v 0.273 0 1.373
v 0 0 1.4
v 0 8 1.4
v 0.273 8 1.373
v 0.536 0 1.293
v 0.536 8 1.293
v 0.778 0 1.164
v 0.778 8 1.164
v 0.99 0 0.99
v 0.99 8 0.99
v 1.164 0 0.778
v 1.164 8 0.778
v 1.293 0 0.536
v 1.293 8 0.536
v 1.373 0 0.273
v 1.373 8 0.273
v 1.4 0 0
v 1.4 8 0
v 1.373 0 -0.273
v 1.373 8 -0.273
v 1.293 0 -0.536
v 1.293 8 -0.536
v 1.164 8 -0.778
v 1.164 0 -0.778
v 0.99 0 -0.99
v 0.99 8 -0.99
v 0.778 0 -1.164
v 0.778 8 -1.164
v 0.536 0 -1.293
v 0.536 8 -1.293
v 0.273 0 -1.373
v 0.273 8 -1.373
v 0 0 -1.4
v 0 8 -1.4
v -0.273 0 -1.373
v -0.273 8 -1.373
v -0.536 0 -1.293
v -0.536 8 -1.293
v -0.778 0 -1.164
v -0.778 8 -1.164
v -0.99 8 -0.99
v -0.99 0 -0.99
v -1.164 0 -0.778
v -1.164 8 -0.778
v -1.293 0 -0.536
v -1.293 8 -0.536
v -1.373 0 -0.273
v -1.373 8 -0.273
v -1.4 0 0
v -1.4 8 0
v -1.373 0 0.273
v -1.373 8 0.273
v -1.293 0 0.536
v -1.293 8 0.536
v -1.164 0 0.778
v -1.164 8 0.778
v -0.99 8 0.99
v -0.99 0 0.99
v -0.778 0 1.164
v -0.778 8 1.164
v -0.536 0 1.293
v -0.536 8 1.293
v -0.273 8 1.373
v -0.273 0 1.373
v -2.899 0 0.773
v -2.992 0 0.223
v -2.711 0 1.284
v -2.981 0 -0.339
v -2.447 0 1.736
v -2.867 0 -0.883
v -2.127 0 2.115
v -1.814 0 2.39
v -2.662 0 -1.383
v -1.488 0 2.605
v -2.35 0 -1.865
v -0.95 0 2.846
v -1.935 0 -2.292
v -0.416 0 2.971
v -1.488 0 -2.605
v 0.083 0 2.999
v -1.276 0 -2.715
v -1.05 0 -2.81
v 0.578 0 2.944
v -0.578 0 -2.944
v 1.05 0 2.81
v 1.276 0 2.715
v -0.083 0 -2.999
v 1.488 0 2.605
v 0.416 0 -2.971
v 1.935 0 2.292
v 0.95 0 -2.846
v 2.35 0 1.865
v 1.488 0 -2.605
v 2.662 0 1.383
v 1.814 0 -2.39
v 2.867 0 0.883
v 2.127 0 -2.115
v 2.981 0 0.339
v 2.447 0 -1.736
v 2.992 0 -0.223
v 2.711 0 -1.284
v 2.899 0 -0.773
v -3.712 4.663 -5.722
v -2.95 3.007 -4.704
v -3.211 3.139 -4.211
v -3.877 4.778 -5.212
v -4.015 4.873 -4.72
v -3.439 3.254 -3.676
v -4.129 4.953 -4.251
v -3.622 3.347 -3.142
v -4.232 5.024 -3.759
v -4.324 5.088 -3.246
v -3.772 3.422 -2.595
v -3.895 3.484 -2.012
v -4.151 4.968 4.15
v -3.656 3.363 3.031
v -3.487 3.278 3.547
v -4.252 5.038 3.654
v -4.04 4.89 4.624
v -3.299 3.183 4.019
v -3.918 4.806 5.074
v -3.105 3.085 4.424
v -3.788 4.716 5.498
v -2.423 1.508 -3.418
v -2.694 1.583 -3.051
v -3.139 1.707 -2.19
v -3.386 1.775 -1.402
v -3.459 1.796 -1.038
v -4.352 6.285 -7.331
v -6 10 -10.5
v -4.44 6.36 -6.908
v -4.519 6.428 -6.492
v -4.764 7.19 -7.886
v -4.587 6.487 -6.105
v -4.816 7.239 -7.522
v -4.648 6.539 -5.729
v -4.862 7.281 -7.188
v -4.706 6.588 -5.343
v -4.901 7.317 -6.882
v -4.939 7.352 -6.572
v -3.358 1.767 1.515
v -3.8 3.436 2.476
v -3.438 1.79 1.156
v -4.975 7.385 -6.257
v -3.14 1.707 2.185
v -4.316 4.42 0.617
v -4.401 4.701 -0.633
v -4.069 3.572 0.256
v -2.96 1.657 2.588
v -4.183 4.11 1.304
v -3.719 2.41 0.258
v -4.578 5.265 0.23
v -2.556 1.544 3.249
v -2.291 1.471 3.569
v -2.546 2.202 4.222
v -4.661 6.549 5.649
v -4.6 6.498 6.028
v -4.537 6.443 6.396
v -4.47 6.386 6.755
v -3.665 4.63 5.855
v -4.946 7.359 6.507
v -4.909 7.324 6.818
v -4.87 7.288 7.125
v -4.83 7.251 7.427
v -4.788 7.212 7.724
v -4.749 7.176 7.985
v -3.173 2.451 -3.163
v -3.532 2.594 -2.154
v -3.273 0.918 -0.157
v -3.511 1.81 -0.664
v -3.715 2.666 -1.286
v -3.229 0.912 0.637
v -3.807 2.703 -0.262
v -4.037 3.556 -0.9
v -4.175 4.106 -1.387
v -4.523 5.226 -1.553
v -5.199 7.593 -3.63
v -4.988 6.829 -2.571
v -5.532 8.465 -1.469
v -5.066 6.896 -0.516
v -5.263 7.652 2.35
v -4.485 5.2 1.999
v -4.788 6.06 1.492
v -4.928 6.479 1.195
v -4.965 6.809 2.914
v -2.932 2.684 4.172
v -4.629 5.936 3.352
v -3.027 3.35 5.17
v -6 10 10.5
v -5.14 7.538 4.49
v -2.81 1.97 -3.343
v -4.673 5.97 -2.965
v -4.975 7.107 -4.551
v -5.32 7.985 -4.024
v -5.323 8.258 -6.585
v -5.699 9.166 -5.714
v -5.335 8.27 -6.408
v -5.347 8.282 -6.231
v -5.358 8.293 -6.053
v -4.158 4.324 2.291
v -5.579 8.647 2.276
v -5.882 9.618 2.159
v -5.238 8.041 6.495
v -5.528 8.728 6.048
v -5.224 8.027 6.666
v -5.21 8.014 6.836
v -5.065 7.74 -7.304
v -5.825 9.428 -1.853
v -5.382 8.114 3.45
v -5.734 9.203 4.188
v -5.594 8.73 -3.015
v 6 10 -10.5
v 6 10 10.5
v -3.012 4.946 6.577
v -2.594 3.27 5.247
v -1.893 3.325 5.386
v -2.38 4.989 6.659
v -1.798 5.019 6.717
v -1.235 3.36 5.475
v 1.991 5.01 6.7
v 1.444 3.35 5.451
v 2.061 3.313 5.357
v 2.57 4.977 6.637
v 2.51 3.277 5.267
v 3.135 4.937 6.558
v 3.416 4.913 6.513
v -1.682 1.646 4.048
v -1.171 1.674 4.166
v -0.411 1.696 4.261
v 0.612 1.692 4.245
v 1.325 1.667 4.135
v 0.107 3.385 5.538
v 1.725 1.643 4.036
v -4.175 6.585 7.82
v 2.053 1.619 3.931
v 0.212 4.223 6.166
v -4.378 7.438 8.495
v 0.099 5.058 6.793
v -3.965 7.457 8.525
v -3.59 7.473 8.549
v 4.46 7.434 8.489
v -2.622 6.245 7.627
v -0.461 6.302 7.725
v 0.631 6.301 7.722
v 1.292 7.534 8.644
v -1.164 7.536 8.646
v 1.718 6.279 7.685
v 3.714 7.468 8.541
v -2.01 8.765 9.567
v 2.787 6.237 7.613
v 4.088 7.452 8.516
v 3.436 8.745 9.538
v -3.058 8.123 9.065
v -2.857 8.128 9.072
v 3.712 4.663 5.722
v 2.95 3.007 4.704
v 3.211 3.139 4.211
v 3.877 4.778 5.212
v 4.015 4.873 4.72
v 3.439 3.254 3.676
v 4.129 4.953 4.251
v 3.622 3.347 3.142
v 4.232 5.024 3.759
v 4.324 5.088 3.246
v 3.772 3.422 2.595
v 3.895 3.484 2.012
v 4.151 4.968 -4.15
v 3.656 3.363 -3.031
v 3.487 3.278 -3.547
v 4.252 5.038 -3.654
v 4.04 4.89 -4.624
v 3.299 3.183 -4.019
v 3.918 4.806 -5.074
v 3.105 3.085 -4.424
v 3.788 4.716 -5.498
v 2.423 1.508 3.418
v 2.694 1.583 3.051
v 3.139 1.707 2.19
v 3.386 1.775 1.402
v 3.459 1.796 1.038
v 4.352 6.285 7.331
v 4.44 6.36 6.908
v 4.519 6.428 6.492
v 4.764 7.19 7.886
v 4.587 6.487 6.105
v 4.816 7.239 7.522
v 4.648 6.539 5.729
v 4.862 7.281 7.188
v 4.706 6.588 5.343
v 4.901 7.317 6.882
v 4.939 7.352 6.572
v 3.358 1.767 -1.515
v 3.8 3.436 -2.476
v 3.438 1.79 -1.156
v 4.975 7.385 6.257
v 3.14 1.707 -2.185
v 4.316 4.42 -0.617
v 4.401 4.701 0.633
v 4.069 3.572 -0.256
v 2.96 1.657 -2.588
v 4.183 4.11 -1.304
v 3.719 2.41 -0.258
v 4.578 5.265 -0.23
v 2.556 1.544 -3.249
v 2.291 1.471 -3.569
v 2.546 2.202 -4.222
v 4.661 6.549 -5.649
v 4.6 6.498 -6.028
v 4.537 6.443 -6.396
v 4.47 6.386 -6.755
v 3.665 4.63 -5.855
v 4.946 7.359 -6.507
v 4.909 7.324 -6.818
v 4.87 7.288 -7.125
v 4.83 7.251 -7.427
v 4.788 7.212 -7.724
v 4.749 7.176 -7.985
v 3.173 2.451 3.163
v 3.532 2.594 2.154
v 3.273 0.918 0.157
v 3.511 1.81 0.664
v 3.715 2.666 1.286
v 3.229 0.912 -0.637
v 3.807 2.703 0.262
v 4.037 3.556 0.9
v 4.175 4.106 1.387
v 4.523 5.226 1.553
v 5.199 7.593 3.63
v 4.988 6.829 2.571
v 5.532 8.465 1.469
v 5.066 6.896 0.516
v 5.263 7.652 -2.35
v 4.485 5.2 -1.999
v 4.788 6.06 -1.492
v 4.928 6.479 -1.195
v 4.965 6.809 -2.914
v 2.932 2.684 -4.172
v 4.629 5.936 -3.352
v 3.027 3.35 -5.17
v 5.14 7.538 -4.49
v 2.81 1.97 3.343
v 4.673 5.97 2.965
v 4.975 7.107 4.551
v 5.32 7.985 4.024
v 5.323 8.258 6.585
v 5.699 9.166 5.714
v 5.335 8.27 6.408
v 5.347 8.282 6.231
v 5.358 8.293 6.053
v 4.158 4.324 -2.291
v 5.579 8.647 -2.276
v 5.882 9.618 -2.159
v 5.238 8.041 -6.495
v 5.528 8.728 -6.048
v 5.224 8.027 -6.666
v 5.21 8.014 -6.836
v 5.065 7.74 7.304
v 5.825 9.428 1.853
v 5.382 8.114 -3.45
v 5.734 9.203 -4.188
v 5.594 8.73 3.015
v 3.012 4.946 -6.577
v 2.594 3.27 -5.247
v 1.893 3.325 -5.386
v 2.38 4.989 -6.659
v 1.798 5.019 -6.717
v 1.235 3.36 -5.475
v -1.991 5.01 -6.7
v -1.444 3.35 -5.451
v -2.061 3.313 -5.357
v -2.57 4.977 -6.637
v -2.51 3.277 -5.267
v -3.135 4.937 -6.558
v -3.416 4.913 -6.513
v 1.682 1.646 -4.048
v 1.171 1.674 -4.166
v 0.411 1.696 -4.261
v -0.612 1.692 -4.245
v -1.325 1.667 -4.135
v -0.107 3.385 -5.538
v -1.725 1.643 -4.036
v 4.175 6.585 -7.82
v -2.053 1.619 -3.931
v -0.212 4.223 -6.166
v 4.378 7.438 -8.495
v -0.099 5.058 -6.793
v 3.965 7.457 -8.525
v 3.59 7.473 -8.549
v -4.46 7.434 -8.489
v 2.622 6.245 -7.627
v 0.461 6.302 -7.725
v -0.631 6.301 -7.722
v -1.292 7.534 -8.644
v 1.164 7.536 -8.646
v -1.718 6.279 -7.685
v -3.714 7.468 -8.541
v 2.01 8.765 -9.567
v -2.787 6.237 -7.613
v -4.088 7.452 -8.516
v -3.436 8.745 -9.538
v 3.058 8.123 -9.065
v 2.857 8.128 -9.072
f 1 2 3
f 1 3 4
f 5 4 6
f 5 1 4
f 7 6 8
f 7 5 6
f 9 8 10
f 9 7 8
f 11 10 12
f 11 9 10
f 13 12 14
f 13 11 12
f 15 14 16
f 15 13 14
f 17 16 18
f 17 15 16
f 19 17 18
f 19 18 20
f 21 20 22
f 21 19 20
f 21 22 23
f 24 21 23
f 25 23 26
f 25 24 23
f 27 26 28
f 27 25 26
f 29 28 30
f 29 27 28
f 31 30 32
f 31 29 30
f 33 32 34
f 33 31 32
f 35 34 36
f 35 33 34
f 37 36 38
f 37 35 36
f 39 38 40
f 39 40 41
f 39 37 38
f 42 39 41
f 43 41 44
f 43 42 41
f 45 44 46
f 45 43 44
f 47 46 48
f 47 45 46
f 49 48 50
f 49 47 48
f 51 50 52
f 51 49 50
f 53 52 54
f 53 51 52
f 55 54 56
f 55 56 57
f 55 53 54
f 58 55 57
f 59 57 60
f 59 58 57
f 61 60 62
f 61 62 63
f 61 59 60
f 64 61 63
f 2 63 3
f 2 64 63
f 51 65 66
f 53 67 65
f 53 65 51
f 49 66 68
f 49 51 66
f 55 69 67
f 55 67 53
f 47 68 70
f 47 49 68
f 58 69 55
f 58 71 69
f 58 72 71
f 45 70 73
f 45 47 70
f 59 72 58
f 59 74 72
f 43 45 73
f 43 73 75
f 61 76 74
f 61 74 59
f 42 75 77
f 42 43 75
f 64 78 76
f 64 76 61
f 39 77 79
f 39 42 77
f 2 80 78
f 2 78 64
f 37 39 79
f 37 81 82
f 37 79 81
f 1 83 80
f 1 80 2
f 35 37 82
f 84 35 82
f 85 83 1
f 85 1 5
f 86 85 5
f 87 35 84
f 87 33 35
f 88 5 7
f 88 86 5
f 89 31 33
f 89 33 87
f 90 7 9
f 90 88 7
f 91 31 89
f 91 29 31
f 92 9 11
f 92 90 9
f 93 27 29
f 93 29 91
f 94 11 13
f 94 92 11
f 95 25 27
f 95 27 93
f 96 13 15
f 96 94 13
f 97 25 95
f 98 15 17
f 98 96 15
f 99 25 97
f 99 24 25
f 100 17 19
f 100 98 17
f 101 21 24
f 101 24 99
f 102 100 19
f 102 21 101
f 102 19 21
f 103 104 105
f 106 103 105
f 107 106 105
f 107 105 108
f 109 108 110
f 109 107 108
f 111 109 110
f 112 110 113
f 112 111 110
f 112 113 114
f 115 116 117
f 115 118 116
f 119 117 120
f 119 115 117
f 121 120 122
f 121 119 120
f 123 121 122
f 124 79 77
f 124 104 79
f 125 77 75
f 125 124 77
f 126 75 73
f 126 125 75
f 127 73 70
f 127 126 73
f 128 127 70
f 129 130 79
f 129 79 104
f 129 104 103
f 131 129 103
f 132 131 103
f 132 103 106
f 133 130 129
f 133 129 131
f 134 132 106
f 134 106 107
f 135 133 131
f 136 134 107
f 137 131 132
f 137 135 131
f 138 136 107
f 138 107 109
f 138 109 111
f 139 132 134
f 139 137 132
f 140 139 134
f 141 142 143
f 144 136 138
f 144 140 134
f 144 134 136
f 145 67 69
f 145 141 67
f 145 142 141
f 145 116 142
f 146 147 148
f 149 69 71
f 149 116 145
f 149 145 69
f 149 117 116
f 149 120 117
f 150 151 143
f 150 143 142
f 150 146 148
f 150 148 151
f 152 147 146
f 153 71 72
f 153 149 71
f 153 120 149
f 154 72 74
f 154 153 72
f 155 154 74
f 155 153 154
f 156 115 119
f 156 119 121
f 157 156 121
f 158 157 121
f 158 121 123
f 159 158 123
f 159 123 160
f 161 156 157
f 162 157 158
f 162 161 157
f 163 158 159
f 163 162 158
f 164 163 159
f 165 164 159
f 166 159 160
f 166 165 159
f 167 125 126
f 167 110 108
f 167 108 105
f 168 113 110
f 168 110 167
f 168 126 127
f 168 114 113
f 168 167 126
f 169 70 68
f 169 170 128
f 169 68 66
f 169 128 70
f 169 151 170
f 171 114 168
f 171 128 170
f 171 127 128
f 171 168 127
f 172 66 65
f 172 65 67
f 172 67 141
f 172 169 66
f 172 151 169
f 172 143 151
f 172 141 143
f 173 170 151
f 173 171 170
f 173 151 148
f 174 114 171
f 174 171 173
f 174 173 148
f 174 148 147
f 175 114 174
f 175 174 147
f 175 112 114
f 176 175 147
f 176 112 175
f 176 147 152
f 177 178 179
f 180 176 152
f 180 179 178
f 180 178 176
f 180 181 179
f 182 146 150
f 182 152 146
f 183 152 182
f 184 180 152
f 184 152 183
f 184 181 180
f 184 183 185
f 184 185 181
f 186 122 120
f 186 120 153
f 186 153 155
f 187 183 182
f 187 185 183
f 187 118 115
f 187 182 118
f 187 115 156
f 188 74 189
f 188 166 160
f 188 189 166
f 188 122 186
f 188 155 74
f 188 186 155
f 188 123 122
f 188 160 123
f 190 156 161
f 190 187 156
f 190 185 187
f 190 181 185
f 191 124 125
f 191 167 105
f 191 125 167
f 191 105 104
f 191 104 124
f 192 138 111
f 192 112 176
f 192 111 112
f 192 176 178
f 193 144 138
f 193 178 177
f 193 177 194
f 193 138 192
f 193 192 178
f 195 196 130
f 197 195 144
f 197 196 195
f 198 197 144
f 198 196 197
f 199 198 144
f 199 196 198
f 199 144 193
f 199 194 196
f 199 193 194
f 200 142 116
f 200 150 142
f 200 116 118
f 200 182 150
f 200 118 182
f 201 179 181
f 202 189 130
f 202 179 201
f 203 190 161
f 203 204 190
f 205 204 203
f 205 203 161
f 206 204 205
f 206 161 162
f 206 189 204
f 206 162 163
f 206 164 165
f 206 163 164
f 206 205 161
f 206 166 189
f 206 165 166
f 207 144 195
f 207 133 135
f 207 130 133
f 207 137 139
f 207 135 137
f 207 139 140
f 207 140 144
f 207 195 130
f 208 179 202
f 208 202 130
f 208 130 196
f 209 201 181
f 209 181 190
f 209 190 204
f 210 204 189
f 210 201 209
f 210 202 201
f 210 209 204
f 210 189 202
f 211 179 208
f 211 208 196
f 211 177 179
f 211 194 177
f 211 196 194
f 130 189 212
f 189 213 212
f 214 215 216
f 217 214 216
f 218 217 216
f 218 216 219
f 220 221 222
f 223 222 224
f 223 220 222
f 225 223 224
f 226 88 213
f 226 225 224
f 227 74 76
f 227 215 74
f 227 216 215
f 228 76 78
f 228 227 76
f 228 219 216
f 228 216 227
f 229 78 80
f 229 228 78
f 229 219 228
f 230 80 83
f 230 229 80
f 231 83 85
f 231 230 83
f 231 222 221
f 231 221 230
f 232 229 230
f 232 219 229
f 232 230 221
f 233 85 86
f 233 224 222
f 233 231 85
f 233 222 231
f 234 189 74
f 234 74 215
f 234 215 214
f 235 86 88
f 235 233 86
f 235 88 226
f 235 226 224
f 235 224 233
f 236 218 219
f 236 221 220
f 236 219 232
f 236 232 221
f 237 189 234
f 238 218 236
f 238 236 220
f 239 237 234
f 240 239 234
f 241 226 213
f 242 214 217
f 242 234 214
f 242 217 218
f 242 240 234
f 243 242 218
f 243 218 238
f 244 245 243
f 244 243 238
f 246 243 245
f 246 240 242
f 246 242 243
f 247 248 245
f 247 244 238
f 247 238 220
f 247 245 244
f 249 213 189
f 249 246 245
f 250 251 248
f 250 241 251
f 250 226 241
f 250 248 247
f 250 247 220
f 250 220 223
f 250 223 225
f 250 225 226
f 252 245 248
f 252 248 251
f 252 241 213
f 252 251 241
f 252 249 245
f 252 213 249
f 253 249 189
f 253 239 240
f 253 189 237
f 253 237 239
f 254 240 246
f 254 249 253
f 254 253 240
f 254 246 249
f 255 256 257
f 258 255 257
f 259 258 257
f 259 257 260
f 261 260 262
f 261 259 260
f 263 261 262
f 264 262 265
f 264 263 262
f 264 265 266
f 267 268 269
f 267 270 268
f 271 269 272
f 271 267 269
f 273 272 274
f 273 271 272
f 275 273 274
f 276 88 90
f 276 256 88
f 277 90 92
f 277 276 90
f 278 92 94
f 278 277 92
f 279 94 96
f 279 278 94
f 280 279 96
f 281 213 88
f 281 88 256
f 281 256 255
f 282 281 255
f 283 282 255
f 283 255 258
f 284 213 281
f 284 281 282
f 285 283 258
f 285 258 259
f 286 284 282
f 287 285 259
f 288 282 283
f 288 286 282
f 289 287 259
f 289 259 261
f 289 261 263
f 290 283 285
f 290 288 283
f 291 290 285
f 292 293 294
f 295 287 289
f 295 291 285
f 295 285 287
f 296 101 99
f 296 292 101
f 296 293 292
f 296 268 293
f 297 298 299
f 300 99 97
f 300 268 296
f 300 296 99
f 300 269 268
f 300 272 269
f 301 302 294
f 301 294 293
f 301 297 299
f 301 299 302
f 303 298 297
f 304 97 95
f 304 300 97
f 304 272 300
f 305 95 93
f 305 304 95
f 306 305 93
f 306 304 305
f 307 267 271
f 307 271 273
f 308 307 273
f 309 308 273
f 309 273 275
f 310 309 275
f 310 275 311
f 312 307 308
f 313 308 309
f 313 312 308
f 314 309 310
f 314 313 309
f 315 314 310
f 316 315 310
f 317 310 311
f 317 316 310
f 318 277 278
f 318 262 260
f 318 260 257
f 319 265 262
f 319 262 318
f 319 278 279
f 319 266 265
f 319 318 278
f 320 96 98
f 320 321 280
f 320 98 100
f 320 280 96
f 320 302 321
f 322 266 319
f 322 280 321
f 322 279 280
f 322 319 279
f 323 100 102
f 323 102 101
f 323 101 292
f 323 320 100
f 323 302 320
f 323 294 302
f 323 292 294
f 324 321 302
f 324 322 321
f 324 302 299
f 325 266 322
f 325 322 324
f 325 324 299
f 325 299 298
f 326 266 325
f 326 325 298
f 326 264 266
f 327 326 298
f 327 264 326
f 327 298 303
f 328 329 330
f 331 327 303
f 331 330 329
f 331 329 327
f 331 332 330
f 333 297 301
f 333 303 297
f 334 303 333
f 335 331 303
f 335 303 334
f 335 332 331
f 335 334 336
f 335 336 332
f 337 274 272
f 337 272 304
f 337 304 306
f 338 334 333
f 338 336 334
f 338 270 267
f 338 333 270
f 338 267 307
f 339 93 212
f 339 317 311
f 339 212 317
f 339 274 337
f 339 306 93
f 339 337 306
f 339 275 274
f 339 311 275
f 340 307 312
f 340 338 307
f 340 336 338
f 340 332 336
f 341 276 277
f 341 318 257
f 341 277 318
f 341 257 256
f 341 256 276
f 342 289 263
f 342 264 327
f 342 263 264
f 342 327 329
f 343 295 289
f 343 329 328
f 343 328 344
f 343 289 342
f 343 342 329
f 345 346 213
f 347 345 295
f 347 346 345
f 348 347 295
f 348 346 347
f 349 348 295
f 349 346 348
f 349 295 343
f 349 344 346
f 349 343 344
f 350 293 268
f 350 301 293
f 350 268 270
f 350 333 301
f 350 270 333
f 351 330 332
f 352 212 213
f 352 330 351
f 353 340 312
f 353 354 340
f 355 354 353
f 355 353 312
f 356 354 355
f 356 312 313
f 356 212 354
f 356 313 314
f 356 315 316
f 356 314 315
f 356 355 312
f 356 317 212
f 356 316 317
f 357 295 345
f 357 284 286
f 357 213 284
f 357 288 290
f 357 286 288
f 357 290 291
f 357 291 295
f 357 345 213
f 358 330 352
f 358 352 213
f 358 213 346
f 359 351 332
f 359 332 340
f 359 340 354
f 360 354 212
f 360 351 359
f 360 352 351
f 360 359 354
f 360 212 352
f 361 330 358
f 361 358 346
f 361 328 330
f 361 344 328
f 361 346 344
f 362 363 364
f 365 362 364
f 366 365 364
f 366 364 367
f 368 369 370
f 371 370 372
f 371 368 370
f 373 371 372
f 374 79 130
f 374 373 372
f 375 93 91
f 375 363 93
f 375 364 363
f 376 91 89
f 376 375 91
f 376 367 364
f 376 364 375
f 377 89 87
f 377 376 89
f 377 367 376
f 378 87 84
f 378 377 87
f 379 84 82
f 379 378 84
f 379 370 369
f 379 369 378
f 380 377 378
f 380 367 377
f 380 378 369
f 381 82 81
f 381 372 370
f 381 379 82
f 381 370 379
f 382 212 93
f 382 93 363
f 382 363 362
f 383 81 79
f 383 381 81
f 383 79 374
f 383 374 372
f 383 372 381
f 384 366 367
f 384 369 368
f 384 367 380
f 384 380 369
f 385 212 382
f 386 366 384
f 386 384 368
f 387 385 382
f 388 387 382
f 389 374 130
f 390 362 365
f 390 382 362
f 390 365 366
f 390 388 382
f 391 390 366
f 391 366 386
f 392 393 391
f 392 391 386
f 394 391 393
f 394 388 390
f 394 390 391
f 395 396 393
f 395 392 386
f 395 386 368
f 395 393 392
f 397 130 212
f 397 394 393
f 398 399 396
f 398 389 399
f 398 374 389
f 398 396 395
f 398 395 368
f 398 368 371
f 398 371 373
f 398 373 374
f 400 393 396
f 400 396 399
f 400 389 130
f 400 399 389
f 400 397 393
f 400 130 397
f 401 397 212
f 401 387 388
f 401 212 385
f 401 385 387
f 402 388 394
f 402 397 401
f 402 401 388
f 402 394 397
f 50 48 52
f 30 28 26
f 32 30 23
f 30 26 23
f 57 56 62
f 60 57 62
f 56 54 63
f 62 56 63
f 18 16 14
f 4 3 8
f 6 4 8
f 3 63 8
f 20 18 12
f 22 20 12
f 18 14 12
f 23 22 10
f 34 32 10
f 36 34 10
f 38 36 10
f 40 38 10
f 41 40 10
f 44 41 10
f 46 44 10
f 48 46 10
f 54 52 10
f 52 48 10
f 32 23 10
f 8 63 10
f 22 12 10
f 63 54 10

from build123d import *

# Parameters (mm, degrees)
SKETCH3_R          = 1.4
CUT_EXTRUDE1_DEPTH = 8


with BuildPart() as part:
    # Sketch1 for Loft2 → Loft2 section 0
    with BuildSketch(Plane(origin=(0, 0, 0), x_dir=(1, 0, 0), z_dir=(0, 1, 0))):
        with BuildLine():
            # circular arc as an exact rational Bezier (weights 1, cos(half-angle), 1)
            Bezier((-1.488416815, -2.604729426), (0, -3.455253321), (1.488416815, -2.604729426), weights=[1, 0.868243142, 1])
            Bezier((1.488416815, -2.604729426), (6.046693312, 0), (1.488416815, 2.604729426), weights=[1, 0.496138938, 1])
            Bezier((1.488416815, 2.604729426), (0, 3.455253321), (-1.488416815, 2.604729426), weights=[1, 0.868243142, 1])
            Bezier((-1.488416815, 2.604729426), (-6.046693312, 0), (-1.488416815, -2.604729426), weights=[1, 0.496138938, 1])
        make_face()
    # Sketch2 → Loft2 section 1
    with BuildSketch(Plane(origin=(0, 10, 0), x_dir=(1, 0, 0), z_dir=(0, 1, 0))):
        with BuildLine():
            Line((-6, -10.5), (6, -10.5))
            Line((6, -10.5), (6, 10.5))
            Line((6, 10.5), (-6, 10.5))
            Line((-6, 10.5), (-6, -10.5))
        make_face()
    loft()

    # Sketch3 → Cut-Extrude1 (cut)
    with BuildSketch(Plane(origin=(0, 0, 0), x_dir=(1, 0, 0), z_dir=(0, 1, 0))):
        with Locations(Location((0, 0, 0), (0, 0, 270))):
            Circle(SKETCH3_R)
    extrude(amount=CUT_EXTRUDE1_DEPTH, mode=Mode.SUBTRACT)


solid = part.part
